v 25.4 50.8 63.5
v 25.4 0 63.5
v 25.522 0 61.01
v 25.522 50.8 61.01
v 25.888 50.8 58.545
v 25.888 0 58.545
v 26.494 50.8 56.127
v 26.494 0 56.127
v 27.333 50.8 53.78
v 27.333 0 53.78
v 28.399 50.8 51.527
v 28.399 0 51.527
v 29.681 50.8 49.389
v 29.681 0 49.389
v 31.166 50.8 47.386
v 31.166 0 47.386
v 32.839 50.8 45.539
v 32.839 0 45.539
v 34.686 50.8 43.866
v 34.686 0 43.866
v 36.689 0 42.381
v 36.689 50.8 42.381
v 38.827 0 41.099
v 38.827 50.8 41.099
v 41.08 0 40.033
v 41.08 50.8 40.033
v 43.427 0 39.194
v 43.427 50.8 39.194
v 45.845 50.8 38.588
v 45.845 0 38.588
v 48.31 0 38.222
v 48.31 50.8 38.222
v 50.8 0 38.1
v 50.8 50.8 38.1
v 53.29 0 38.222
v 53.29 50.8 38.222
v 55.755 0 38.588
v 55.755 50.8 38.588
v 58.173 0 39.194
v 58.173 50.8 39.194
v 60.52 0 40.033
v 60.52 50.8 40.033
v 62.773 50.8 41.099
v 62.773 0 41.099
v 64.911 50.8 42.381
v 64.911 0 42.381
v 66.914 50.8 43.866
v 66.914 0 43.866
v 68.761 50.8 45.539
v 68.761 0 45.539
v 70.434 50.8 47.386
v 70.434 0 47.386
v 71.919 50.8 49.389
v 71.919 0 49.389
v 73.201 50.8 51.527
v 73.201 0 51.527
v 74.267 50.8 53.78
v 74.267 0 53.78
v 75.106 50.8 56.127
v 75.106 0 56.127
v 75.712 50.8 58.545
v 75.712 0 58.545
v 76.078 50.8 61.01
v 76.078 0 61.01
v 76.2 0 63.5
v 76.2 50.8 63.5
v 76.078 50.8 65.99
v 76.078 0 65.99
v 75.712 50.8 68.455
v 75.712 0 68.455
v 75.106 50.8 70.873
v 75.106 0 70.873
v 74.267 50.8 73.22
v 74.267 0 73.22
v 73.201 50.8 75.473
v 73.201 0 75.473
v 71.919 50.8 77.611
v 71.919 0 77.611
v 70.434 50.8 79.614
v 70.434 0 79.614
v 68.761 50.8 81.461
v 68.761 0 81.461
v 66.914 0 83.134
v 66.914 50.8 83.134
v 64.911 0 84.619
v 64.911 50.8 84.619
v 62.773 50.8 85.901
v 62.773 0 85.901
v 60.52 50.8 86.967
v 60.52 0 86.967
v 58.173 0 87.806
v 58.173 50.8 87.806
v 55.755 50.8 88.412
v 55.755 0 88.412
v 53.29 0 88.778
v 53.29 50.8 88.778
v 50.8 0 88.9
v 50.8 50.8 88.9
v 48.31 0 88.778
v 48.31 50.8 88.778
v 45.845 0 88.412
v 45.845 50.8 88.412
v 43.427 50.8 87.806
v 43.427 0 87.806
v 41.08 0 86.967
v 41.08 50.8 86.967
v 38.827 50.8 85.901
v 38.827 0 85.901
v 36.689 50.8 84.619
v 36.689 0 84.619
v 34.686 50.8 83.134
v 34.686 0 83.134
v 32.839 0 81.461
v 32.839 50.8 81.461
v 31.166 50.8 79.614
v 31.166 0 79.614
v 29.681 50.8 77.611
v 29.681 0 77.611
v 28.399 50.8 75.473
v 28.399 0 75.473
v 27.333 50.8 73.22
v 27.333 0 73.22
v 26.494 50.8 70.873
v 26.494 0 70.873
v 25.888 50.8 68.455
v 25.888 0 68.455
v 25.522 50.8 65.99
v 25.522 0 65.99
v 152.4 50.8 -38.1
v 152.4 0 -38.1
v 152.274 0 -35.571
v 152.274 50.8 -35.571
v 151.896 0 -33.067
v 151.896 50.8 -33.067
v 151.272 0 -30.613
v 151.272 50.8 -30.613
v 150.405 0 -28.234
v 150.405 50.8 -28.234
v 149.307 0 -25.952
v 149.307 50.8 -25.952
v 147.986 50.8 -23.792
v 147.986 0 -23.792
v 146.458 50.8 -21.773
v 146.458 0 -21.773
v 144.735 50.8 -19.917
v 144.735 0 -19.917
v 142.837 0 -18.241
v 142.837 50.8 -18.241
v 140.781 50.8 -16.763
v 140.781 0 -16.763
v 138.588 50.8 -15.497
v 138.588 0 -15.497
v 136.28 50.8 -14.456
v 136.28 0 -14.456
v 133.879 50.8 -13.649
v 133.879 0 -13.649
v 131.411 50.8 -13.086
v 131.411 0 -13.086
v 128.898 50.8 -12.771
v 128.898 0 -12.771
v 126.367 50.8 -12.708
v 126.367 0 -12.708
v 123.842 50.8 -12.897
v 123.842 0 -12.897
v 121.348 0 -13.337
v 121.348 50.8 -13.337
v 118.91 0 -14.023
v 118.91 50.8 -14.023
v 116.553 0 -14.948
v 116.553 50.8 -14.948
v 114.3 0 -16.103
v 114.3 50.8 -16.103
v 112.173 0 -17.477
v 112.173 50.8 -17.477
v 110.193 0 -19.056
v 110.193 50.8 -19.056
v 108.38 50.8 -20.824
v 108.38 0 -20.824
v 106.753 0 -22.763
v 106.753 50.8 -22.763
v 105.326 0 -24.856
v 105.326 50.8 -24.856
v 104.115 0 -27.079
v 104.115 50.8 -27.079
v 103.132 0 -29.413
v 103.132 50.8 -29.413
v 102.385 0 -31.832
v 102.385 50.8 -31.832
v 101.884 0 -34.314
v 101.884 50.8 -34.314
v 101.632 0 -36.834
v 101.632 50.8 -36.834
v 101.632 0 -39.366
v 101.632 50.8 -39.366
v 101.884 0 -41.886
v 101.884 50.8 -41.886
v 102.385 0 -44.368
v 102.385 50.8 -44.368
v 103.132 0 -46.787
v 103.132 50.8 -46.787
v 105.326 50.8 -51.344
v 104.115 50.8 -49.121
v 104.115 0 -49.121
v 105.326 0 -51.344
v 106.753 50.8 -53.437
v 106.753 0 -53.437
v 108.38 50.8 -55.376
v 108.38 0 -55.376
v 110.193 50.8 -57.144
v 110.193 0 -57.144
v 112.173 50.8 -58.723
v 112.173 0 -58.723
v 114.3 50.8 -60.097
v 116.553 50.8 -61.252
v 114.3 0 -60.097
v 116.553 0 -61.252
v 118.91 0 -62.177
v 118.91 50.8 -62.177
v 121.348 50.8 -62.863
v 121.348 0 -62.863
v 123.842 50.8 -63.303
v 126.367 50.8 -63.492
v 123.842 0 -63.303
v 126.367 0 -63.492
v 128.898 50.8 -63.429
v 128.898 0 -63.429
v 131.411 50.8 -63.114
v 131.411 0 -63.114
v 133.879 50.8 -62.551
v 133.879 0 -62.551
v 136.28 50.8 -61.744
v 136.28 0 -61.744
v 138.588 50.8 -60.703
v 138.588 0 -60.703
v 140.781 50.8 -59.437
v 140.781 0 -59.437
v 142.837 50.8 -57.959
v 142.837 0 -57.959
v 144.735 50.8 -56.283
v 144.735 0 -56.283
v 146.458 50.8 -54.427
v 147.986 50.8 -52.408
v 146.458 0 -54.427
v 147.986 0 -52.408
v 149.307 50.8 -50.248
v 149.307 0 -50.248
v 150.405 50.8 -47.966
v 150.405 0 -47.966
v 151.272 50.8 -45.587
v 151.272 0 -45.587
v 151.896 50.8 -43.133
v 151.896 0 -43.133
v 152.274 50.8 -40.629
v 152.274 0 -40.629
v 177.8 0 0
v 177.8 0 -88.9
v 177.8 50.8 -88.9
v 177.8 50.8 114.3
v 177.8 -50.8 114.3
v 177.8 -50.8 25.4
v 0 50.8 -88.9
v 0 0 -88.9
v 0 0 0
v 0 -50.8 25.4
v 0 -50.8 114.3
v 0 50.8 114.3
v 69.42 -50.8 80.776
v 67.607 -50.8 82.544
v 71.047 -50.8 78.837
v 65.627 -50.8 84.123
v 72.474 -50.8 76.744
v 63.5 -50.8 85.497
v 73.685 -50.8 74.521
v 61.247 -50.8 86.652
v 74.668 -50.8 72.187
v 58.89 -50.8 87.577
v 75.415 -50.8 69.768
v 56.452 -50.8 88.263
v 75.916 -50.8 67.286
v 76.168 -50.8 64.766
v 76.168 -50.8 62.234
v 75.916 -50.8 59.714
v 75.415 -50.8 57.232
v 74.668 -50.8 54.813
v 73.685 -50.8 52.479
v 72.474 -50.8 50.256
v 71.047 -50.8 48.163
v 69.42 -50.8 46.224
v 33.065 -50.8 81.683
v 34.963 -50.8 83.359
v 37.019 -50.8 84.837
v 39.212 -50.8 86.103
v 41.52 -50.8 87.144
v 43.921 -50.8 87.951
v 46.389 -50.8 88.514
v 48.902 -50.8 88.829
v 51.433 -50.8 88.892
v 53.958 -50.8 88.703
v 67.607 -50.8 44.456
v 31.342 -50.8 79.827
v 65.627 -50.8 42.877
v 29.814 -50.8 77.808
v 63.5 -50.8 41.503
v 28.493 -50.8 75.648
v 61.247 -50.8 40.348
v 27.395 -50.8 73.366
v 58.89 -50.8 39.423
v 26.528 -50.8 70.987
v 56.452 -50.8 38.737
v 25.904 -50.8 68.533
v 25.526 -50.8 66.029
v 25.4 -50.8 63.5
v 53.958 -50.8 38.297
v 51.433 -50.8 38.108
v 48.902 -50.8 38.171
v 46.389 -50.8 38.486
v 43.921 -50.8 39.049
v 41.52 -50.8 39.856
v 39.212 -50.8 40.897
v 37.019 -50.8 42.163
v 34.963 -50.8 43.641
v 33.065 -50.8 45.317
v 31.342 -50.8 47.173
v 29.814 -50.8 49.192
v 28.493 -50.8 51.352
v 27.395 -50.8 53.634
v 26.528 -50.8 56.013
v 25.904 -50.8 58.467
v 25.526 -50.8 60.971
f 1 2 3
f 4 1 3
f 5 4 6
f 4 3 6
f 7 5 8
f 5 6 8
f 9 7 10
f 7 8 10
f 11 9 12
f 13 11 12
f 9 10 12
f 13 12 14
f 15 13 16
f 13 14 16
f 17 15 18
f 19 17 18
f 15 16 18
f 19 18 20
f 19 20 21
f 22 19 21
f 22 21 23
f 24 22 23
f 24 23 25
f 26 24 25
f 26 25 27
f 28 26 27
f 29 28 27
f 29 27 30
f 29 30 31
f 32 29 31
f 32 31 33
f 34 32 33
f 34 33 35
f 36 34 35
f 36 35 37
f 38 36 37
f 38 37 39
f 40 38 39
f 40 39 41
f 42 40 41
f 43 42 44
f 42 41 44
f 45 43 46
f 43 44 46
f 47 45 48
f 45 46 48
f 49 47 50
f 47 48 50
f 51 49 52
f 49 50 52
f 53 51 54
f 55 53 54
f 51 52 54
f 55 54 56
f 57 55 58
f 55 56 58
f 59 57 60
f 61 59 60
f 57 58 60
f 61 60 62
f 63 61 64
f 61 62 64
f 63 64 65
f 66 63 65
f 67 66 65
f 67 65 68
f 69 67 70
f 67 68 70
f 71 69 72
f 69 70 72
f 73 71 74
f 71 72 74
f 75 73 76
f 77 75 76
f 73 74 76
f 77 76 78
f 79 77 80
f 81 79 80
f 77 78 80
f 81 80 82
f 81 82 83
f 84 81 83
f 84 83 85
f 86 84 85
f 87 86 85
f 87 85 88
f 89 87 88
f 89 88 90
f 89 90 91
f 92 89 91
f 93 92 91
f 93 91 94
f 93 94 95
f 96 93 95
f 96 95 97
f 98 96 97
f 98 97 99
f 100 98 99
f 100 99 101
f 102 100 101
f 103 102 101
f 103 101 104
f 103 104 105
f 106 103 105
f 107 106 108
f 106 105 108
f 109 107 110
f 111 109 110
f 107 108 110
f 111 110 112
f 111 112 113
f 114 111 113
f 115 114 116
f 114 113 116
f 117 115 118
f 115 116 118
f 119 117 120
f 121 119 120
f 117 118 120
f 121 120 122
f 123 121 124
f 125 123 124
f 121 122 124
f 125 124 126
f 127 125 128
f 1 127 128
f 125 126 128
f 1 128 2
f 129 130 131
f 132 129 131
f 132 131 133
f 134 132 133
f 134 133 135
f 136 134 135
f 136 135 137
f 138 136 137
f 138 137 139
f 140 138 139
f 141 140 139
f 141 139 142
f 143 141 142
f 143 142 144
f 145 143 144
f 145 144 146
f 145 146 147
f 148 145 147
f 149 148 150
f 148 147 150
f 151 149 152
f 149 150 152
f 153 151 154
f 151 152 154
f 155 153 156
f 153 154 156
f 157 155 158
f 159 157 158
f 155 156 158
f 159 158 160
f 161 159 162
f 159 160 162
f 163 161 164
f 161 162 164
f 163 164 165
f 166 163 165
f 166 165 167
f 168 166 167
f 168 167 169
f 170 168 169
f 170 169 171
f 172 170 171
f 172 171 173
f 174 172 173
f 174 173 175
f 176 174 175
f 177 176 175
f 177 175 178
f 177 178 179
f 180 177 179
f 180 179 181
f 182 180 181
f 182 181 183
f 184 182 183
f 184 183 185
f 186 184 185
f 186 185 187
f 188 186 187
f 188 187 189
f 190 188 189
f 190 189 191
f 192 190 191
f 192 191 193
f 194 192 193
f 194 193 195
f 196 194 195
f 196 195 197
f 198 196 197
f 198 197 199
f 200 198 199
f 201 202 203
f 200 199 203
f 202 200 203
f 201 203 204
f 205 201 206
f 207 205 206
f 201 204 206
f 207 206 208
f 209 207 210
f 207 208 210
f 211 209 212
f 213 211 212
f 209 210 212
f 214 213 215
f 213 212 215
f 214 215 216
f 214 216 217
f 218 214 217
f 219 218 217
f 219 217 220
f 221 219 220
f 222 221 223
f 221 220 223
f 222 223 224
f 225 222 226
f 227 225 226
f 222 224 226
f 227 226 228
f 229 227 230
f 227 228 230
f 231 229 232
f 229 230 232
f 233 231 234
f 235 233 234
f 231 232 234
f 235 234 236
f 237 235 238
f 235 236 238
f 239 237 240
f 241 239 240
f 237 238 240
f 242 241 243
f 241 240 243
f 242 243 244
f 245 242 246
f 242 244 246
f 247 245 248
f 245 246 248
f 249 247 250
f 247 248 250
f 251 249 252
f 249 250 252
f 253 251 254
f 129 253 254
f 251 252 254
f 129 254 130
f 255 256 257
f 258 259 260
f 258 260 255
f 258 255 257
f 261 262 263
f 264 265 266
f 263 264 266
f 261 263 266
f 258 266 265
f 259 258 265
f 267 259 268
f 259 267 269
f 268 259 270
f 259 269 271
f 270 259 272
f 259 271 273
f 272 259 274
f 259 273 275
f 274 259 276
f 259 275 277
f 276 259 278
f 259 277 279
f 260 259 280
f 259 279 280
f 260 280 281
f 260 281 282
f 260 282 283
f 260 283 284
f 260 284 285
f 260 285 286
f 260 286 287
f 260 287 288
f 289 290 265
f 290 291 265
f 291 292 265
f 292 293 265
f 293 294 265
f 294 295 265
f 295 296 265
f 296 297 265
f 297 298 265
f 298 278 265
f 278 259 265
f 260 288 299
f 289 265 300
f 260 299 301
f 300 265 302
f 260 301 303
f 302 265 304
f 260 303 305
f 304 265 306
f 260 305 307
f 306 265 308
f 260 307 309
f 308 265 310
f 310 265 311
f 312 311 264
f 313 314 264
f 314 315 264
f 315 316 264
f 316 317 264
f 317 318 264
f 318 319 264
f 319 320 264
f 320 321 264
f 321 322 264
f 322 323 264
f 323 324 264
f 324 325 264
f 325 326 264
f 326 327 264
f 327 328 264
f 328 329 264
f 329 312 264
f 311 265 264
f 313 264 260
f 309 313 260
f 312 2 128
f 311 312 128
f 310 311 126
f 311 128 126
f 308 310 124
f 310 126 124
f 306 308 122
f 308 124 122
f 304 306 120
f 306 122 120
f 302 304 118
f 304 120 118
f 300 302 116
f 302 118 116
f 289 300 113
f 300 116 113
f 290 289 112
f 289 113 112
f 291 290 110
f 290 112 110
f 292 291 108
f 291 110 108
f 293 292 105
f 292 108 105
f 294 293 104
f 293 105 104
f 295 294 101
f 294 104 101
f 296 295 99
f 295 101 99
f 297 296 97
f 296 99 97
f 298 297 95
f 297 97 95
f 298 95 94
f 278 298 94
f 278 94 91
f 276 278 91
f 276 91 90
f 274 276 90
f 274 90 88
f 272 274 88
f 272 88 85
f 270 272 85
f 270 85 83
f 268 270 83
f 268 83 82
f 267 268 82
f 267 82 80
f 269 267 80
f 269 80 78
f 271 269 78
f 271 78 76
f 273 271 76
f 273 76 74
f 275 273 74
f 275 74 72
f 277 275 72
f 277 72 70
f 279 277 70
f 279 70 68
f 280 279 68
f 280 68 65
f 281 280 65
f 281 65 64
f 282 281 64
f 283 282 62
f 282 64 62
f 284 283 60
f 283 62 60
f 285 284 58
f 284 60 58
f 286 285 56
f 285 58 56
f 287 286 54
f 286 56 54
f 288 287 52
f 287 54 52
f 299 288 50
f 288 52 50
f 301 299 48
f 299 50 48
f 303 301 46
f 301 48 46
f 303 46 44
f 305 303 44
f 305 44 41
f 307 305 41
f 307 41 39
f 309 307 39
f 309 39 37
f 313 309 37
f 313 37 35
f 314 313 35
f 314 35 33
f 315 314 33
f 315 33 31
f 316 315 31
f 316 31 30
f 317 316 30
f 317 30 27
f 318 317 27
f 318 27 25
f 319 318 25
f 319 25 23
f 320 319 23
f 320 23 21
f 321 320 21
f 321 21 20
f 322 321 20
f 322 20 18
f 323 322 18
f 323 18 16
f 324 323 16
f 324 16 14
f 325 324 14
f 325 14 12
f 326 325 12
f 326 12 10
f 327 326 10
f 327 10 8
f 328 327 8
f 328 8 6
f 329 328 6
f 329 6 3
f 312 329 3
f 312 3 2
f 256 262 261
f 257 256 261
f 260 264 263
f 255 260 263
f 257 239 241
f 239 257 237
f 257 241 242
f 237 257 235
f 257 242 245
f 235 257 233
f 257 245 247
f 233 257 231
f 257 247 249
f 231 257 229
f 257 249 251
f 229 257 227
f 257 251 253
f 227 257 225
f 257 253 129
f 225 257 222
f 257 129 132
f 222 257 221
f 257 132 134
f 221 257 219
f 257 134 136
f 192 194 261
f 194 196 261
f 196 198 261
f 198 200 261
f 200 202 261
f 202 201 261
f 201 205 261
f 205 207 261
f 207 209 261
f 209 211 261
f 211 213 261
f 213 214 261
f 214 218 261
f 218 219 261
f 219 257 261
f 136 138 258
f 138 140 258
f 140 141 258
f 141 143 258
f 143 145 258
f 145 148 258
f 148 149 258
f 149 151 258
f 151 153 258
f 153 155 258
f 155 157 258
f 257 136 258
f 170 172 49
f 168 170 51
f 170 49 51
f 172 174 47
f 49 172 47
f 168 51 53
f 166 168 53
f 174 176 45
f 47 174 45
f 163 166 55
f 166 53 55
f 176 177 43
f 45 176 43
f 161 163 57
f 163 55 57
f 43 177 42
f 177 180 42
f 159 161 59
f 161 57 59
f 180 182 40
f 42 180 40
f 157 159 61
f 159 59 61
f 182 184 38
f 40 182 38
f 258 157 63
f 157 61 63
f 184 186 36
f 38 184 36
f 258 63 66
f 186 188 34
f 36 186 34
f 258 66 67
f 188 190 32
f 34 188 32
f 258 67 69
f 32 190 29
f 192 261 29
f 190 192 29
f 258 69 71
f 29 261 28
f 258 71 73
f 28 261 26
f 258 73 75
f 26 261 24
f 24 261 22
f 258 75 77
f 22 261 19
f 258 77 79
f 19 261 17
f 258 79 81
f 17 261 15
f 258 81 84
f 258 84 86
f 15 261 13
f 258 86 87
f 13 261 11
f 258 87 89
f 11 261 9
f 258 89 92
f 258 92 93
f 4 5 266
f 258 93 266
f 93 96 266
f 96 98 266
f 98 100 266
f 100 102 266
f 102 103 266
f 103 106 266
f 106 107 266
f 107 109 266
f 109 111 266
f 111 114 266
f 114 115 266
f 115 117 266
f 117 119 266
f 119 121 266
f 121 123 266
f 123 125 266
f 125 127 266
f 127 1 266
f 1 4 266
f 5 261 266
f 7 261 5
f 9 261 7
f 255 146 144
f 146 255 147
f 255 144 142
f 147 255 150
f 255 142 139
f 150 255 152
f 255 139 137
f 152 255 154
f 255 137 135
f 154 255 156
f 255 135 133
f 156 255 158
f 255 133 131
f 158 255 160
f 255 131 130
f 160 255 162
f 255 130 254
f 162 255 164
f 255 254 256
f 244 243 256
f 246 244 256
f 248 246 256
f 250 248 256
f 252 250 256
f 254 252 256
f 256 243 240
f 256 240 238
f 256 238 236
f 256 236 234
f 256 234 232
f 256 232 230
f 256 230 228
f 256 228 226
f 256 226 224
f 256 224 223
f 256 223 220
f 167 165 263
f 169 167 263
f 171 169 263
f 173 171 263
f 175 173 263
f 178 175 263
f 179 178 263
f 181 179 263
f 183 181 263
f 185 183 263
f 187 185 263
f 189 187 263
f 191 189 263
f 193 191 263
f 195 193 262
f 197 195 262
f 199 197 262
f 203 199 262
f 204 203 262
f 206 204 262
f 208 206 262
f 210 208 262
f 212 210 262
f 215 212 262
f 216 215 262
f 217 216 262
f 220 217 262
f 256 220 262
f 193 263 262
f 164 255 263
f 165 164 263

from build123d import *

# Parameters (mm, degrees)
F1_DEPTH = 177.8
F2_R     = 25.4
F3_DEPTH = 136.398
F4_R     = 25.4
F5_DEPTH = 138.684


with BuildPart() as f1:
    # F0 (on Right) → F1 (new body)
    with BuildSketch(Plane.YZ):
        Polygon((0, 0), (0, -88.9), (50.8, -88.9), (50.8, 114.3), (-50.8, 114.3), (-50.8, 25.4), align=None)
    extrude(amount=F1_DEPTH)

    # F2 (on Front) → F3 (cut)
    with BuildSketch(Plane.XZ):
        with Locations((50.8, 63.5)):
            Circle(F2_R)
        with Locations((127, -38.1)):
            Circle(F2_R)
    extrude(amount=-F3_DEPTH, mode=Mode.SUBTRACT)

    # F4 (on face) → F5 (cut)
    with BuildSketch(Plane(origin=(0, 50.8, 0), x_dir=(-1, 0, 0), z_dir=(0, 1, 0))):
        with Locations((-50.8, 63.5)):
            Circle(F4_R)
    extrude(amount=-F5_DEPTH, mode=Mode.SUBTRACT)


solid = f1.part
